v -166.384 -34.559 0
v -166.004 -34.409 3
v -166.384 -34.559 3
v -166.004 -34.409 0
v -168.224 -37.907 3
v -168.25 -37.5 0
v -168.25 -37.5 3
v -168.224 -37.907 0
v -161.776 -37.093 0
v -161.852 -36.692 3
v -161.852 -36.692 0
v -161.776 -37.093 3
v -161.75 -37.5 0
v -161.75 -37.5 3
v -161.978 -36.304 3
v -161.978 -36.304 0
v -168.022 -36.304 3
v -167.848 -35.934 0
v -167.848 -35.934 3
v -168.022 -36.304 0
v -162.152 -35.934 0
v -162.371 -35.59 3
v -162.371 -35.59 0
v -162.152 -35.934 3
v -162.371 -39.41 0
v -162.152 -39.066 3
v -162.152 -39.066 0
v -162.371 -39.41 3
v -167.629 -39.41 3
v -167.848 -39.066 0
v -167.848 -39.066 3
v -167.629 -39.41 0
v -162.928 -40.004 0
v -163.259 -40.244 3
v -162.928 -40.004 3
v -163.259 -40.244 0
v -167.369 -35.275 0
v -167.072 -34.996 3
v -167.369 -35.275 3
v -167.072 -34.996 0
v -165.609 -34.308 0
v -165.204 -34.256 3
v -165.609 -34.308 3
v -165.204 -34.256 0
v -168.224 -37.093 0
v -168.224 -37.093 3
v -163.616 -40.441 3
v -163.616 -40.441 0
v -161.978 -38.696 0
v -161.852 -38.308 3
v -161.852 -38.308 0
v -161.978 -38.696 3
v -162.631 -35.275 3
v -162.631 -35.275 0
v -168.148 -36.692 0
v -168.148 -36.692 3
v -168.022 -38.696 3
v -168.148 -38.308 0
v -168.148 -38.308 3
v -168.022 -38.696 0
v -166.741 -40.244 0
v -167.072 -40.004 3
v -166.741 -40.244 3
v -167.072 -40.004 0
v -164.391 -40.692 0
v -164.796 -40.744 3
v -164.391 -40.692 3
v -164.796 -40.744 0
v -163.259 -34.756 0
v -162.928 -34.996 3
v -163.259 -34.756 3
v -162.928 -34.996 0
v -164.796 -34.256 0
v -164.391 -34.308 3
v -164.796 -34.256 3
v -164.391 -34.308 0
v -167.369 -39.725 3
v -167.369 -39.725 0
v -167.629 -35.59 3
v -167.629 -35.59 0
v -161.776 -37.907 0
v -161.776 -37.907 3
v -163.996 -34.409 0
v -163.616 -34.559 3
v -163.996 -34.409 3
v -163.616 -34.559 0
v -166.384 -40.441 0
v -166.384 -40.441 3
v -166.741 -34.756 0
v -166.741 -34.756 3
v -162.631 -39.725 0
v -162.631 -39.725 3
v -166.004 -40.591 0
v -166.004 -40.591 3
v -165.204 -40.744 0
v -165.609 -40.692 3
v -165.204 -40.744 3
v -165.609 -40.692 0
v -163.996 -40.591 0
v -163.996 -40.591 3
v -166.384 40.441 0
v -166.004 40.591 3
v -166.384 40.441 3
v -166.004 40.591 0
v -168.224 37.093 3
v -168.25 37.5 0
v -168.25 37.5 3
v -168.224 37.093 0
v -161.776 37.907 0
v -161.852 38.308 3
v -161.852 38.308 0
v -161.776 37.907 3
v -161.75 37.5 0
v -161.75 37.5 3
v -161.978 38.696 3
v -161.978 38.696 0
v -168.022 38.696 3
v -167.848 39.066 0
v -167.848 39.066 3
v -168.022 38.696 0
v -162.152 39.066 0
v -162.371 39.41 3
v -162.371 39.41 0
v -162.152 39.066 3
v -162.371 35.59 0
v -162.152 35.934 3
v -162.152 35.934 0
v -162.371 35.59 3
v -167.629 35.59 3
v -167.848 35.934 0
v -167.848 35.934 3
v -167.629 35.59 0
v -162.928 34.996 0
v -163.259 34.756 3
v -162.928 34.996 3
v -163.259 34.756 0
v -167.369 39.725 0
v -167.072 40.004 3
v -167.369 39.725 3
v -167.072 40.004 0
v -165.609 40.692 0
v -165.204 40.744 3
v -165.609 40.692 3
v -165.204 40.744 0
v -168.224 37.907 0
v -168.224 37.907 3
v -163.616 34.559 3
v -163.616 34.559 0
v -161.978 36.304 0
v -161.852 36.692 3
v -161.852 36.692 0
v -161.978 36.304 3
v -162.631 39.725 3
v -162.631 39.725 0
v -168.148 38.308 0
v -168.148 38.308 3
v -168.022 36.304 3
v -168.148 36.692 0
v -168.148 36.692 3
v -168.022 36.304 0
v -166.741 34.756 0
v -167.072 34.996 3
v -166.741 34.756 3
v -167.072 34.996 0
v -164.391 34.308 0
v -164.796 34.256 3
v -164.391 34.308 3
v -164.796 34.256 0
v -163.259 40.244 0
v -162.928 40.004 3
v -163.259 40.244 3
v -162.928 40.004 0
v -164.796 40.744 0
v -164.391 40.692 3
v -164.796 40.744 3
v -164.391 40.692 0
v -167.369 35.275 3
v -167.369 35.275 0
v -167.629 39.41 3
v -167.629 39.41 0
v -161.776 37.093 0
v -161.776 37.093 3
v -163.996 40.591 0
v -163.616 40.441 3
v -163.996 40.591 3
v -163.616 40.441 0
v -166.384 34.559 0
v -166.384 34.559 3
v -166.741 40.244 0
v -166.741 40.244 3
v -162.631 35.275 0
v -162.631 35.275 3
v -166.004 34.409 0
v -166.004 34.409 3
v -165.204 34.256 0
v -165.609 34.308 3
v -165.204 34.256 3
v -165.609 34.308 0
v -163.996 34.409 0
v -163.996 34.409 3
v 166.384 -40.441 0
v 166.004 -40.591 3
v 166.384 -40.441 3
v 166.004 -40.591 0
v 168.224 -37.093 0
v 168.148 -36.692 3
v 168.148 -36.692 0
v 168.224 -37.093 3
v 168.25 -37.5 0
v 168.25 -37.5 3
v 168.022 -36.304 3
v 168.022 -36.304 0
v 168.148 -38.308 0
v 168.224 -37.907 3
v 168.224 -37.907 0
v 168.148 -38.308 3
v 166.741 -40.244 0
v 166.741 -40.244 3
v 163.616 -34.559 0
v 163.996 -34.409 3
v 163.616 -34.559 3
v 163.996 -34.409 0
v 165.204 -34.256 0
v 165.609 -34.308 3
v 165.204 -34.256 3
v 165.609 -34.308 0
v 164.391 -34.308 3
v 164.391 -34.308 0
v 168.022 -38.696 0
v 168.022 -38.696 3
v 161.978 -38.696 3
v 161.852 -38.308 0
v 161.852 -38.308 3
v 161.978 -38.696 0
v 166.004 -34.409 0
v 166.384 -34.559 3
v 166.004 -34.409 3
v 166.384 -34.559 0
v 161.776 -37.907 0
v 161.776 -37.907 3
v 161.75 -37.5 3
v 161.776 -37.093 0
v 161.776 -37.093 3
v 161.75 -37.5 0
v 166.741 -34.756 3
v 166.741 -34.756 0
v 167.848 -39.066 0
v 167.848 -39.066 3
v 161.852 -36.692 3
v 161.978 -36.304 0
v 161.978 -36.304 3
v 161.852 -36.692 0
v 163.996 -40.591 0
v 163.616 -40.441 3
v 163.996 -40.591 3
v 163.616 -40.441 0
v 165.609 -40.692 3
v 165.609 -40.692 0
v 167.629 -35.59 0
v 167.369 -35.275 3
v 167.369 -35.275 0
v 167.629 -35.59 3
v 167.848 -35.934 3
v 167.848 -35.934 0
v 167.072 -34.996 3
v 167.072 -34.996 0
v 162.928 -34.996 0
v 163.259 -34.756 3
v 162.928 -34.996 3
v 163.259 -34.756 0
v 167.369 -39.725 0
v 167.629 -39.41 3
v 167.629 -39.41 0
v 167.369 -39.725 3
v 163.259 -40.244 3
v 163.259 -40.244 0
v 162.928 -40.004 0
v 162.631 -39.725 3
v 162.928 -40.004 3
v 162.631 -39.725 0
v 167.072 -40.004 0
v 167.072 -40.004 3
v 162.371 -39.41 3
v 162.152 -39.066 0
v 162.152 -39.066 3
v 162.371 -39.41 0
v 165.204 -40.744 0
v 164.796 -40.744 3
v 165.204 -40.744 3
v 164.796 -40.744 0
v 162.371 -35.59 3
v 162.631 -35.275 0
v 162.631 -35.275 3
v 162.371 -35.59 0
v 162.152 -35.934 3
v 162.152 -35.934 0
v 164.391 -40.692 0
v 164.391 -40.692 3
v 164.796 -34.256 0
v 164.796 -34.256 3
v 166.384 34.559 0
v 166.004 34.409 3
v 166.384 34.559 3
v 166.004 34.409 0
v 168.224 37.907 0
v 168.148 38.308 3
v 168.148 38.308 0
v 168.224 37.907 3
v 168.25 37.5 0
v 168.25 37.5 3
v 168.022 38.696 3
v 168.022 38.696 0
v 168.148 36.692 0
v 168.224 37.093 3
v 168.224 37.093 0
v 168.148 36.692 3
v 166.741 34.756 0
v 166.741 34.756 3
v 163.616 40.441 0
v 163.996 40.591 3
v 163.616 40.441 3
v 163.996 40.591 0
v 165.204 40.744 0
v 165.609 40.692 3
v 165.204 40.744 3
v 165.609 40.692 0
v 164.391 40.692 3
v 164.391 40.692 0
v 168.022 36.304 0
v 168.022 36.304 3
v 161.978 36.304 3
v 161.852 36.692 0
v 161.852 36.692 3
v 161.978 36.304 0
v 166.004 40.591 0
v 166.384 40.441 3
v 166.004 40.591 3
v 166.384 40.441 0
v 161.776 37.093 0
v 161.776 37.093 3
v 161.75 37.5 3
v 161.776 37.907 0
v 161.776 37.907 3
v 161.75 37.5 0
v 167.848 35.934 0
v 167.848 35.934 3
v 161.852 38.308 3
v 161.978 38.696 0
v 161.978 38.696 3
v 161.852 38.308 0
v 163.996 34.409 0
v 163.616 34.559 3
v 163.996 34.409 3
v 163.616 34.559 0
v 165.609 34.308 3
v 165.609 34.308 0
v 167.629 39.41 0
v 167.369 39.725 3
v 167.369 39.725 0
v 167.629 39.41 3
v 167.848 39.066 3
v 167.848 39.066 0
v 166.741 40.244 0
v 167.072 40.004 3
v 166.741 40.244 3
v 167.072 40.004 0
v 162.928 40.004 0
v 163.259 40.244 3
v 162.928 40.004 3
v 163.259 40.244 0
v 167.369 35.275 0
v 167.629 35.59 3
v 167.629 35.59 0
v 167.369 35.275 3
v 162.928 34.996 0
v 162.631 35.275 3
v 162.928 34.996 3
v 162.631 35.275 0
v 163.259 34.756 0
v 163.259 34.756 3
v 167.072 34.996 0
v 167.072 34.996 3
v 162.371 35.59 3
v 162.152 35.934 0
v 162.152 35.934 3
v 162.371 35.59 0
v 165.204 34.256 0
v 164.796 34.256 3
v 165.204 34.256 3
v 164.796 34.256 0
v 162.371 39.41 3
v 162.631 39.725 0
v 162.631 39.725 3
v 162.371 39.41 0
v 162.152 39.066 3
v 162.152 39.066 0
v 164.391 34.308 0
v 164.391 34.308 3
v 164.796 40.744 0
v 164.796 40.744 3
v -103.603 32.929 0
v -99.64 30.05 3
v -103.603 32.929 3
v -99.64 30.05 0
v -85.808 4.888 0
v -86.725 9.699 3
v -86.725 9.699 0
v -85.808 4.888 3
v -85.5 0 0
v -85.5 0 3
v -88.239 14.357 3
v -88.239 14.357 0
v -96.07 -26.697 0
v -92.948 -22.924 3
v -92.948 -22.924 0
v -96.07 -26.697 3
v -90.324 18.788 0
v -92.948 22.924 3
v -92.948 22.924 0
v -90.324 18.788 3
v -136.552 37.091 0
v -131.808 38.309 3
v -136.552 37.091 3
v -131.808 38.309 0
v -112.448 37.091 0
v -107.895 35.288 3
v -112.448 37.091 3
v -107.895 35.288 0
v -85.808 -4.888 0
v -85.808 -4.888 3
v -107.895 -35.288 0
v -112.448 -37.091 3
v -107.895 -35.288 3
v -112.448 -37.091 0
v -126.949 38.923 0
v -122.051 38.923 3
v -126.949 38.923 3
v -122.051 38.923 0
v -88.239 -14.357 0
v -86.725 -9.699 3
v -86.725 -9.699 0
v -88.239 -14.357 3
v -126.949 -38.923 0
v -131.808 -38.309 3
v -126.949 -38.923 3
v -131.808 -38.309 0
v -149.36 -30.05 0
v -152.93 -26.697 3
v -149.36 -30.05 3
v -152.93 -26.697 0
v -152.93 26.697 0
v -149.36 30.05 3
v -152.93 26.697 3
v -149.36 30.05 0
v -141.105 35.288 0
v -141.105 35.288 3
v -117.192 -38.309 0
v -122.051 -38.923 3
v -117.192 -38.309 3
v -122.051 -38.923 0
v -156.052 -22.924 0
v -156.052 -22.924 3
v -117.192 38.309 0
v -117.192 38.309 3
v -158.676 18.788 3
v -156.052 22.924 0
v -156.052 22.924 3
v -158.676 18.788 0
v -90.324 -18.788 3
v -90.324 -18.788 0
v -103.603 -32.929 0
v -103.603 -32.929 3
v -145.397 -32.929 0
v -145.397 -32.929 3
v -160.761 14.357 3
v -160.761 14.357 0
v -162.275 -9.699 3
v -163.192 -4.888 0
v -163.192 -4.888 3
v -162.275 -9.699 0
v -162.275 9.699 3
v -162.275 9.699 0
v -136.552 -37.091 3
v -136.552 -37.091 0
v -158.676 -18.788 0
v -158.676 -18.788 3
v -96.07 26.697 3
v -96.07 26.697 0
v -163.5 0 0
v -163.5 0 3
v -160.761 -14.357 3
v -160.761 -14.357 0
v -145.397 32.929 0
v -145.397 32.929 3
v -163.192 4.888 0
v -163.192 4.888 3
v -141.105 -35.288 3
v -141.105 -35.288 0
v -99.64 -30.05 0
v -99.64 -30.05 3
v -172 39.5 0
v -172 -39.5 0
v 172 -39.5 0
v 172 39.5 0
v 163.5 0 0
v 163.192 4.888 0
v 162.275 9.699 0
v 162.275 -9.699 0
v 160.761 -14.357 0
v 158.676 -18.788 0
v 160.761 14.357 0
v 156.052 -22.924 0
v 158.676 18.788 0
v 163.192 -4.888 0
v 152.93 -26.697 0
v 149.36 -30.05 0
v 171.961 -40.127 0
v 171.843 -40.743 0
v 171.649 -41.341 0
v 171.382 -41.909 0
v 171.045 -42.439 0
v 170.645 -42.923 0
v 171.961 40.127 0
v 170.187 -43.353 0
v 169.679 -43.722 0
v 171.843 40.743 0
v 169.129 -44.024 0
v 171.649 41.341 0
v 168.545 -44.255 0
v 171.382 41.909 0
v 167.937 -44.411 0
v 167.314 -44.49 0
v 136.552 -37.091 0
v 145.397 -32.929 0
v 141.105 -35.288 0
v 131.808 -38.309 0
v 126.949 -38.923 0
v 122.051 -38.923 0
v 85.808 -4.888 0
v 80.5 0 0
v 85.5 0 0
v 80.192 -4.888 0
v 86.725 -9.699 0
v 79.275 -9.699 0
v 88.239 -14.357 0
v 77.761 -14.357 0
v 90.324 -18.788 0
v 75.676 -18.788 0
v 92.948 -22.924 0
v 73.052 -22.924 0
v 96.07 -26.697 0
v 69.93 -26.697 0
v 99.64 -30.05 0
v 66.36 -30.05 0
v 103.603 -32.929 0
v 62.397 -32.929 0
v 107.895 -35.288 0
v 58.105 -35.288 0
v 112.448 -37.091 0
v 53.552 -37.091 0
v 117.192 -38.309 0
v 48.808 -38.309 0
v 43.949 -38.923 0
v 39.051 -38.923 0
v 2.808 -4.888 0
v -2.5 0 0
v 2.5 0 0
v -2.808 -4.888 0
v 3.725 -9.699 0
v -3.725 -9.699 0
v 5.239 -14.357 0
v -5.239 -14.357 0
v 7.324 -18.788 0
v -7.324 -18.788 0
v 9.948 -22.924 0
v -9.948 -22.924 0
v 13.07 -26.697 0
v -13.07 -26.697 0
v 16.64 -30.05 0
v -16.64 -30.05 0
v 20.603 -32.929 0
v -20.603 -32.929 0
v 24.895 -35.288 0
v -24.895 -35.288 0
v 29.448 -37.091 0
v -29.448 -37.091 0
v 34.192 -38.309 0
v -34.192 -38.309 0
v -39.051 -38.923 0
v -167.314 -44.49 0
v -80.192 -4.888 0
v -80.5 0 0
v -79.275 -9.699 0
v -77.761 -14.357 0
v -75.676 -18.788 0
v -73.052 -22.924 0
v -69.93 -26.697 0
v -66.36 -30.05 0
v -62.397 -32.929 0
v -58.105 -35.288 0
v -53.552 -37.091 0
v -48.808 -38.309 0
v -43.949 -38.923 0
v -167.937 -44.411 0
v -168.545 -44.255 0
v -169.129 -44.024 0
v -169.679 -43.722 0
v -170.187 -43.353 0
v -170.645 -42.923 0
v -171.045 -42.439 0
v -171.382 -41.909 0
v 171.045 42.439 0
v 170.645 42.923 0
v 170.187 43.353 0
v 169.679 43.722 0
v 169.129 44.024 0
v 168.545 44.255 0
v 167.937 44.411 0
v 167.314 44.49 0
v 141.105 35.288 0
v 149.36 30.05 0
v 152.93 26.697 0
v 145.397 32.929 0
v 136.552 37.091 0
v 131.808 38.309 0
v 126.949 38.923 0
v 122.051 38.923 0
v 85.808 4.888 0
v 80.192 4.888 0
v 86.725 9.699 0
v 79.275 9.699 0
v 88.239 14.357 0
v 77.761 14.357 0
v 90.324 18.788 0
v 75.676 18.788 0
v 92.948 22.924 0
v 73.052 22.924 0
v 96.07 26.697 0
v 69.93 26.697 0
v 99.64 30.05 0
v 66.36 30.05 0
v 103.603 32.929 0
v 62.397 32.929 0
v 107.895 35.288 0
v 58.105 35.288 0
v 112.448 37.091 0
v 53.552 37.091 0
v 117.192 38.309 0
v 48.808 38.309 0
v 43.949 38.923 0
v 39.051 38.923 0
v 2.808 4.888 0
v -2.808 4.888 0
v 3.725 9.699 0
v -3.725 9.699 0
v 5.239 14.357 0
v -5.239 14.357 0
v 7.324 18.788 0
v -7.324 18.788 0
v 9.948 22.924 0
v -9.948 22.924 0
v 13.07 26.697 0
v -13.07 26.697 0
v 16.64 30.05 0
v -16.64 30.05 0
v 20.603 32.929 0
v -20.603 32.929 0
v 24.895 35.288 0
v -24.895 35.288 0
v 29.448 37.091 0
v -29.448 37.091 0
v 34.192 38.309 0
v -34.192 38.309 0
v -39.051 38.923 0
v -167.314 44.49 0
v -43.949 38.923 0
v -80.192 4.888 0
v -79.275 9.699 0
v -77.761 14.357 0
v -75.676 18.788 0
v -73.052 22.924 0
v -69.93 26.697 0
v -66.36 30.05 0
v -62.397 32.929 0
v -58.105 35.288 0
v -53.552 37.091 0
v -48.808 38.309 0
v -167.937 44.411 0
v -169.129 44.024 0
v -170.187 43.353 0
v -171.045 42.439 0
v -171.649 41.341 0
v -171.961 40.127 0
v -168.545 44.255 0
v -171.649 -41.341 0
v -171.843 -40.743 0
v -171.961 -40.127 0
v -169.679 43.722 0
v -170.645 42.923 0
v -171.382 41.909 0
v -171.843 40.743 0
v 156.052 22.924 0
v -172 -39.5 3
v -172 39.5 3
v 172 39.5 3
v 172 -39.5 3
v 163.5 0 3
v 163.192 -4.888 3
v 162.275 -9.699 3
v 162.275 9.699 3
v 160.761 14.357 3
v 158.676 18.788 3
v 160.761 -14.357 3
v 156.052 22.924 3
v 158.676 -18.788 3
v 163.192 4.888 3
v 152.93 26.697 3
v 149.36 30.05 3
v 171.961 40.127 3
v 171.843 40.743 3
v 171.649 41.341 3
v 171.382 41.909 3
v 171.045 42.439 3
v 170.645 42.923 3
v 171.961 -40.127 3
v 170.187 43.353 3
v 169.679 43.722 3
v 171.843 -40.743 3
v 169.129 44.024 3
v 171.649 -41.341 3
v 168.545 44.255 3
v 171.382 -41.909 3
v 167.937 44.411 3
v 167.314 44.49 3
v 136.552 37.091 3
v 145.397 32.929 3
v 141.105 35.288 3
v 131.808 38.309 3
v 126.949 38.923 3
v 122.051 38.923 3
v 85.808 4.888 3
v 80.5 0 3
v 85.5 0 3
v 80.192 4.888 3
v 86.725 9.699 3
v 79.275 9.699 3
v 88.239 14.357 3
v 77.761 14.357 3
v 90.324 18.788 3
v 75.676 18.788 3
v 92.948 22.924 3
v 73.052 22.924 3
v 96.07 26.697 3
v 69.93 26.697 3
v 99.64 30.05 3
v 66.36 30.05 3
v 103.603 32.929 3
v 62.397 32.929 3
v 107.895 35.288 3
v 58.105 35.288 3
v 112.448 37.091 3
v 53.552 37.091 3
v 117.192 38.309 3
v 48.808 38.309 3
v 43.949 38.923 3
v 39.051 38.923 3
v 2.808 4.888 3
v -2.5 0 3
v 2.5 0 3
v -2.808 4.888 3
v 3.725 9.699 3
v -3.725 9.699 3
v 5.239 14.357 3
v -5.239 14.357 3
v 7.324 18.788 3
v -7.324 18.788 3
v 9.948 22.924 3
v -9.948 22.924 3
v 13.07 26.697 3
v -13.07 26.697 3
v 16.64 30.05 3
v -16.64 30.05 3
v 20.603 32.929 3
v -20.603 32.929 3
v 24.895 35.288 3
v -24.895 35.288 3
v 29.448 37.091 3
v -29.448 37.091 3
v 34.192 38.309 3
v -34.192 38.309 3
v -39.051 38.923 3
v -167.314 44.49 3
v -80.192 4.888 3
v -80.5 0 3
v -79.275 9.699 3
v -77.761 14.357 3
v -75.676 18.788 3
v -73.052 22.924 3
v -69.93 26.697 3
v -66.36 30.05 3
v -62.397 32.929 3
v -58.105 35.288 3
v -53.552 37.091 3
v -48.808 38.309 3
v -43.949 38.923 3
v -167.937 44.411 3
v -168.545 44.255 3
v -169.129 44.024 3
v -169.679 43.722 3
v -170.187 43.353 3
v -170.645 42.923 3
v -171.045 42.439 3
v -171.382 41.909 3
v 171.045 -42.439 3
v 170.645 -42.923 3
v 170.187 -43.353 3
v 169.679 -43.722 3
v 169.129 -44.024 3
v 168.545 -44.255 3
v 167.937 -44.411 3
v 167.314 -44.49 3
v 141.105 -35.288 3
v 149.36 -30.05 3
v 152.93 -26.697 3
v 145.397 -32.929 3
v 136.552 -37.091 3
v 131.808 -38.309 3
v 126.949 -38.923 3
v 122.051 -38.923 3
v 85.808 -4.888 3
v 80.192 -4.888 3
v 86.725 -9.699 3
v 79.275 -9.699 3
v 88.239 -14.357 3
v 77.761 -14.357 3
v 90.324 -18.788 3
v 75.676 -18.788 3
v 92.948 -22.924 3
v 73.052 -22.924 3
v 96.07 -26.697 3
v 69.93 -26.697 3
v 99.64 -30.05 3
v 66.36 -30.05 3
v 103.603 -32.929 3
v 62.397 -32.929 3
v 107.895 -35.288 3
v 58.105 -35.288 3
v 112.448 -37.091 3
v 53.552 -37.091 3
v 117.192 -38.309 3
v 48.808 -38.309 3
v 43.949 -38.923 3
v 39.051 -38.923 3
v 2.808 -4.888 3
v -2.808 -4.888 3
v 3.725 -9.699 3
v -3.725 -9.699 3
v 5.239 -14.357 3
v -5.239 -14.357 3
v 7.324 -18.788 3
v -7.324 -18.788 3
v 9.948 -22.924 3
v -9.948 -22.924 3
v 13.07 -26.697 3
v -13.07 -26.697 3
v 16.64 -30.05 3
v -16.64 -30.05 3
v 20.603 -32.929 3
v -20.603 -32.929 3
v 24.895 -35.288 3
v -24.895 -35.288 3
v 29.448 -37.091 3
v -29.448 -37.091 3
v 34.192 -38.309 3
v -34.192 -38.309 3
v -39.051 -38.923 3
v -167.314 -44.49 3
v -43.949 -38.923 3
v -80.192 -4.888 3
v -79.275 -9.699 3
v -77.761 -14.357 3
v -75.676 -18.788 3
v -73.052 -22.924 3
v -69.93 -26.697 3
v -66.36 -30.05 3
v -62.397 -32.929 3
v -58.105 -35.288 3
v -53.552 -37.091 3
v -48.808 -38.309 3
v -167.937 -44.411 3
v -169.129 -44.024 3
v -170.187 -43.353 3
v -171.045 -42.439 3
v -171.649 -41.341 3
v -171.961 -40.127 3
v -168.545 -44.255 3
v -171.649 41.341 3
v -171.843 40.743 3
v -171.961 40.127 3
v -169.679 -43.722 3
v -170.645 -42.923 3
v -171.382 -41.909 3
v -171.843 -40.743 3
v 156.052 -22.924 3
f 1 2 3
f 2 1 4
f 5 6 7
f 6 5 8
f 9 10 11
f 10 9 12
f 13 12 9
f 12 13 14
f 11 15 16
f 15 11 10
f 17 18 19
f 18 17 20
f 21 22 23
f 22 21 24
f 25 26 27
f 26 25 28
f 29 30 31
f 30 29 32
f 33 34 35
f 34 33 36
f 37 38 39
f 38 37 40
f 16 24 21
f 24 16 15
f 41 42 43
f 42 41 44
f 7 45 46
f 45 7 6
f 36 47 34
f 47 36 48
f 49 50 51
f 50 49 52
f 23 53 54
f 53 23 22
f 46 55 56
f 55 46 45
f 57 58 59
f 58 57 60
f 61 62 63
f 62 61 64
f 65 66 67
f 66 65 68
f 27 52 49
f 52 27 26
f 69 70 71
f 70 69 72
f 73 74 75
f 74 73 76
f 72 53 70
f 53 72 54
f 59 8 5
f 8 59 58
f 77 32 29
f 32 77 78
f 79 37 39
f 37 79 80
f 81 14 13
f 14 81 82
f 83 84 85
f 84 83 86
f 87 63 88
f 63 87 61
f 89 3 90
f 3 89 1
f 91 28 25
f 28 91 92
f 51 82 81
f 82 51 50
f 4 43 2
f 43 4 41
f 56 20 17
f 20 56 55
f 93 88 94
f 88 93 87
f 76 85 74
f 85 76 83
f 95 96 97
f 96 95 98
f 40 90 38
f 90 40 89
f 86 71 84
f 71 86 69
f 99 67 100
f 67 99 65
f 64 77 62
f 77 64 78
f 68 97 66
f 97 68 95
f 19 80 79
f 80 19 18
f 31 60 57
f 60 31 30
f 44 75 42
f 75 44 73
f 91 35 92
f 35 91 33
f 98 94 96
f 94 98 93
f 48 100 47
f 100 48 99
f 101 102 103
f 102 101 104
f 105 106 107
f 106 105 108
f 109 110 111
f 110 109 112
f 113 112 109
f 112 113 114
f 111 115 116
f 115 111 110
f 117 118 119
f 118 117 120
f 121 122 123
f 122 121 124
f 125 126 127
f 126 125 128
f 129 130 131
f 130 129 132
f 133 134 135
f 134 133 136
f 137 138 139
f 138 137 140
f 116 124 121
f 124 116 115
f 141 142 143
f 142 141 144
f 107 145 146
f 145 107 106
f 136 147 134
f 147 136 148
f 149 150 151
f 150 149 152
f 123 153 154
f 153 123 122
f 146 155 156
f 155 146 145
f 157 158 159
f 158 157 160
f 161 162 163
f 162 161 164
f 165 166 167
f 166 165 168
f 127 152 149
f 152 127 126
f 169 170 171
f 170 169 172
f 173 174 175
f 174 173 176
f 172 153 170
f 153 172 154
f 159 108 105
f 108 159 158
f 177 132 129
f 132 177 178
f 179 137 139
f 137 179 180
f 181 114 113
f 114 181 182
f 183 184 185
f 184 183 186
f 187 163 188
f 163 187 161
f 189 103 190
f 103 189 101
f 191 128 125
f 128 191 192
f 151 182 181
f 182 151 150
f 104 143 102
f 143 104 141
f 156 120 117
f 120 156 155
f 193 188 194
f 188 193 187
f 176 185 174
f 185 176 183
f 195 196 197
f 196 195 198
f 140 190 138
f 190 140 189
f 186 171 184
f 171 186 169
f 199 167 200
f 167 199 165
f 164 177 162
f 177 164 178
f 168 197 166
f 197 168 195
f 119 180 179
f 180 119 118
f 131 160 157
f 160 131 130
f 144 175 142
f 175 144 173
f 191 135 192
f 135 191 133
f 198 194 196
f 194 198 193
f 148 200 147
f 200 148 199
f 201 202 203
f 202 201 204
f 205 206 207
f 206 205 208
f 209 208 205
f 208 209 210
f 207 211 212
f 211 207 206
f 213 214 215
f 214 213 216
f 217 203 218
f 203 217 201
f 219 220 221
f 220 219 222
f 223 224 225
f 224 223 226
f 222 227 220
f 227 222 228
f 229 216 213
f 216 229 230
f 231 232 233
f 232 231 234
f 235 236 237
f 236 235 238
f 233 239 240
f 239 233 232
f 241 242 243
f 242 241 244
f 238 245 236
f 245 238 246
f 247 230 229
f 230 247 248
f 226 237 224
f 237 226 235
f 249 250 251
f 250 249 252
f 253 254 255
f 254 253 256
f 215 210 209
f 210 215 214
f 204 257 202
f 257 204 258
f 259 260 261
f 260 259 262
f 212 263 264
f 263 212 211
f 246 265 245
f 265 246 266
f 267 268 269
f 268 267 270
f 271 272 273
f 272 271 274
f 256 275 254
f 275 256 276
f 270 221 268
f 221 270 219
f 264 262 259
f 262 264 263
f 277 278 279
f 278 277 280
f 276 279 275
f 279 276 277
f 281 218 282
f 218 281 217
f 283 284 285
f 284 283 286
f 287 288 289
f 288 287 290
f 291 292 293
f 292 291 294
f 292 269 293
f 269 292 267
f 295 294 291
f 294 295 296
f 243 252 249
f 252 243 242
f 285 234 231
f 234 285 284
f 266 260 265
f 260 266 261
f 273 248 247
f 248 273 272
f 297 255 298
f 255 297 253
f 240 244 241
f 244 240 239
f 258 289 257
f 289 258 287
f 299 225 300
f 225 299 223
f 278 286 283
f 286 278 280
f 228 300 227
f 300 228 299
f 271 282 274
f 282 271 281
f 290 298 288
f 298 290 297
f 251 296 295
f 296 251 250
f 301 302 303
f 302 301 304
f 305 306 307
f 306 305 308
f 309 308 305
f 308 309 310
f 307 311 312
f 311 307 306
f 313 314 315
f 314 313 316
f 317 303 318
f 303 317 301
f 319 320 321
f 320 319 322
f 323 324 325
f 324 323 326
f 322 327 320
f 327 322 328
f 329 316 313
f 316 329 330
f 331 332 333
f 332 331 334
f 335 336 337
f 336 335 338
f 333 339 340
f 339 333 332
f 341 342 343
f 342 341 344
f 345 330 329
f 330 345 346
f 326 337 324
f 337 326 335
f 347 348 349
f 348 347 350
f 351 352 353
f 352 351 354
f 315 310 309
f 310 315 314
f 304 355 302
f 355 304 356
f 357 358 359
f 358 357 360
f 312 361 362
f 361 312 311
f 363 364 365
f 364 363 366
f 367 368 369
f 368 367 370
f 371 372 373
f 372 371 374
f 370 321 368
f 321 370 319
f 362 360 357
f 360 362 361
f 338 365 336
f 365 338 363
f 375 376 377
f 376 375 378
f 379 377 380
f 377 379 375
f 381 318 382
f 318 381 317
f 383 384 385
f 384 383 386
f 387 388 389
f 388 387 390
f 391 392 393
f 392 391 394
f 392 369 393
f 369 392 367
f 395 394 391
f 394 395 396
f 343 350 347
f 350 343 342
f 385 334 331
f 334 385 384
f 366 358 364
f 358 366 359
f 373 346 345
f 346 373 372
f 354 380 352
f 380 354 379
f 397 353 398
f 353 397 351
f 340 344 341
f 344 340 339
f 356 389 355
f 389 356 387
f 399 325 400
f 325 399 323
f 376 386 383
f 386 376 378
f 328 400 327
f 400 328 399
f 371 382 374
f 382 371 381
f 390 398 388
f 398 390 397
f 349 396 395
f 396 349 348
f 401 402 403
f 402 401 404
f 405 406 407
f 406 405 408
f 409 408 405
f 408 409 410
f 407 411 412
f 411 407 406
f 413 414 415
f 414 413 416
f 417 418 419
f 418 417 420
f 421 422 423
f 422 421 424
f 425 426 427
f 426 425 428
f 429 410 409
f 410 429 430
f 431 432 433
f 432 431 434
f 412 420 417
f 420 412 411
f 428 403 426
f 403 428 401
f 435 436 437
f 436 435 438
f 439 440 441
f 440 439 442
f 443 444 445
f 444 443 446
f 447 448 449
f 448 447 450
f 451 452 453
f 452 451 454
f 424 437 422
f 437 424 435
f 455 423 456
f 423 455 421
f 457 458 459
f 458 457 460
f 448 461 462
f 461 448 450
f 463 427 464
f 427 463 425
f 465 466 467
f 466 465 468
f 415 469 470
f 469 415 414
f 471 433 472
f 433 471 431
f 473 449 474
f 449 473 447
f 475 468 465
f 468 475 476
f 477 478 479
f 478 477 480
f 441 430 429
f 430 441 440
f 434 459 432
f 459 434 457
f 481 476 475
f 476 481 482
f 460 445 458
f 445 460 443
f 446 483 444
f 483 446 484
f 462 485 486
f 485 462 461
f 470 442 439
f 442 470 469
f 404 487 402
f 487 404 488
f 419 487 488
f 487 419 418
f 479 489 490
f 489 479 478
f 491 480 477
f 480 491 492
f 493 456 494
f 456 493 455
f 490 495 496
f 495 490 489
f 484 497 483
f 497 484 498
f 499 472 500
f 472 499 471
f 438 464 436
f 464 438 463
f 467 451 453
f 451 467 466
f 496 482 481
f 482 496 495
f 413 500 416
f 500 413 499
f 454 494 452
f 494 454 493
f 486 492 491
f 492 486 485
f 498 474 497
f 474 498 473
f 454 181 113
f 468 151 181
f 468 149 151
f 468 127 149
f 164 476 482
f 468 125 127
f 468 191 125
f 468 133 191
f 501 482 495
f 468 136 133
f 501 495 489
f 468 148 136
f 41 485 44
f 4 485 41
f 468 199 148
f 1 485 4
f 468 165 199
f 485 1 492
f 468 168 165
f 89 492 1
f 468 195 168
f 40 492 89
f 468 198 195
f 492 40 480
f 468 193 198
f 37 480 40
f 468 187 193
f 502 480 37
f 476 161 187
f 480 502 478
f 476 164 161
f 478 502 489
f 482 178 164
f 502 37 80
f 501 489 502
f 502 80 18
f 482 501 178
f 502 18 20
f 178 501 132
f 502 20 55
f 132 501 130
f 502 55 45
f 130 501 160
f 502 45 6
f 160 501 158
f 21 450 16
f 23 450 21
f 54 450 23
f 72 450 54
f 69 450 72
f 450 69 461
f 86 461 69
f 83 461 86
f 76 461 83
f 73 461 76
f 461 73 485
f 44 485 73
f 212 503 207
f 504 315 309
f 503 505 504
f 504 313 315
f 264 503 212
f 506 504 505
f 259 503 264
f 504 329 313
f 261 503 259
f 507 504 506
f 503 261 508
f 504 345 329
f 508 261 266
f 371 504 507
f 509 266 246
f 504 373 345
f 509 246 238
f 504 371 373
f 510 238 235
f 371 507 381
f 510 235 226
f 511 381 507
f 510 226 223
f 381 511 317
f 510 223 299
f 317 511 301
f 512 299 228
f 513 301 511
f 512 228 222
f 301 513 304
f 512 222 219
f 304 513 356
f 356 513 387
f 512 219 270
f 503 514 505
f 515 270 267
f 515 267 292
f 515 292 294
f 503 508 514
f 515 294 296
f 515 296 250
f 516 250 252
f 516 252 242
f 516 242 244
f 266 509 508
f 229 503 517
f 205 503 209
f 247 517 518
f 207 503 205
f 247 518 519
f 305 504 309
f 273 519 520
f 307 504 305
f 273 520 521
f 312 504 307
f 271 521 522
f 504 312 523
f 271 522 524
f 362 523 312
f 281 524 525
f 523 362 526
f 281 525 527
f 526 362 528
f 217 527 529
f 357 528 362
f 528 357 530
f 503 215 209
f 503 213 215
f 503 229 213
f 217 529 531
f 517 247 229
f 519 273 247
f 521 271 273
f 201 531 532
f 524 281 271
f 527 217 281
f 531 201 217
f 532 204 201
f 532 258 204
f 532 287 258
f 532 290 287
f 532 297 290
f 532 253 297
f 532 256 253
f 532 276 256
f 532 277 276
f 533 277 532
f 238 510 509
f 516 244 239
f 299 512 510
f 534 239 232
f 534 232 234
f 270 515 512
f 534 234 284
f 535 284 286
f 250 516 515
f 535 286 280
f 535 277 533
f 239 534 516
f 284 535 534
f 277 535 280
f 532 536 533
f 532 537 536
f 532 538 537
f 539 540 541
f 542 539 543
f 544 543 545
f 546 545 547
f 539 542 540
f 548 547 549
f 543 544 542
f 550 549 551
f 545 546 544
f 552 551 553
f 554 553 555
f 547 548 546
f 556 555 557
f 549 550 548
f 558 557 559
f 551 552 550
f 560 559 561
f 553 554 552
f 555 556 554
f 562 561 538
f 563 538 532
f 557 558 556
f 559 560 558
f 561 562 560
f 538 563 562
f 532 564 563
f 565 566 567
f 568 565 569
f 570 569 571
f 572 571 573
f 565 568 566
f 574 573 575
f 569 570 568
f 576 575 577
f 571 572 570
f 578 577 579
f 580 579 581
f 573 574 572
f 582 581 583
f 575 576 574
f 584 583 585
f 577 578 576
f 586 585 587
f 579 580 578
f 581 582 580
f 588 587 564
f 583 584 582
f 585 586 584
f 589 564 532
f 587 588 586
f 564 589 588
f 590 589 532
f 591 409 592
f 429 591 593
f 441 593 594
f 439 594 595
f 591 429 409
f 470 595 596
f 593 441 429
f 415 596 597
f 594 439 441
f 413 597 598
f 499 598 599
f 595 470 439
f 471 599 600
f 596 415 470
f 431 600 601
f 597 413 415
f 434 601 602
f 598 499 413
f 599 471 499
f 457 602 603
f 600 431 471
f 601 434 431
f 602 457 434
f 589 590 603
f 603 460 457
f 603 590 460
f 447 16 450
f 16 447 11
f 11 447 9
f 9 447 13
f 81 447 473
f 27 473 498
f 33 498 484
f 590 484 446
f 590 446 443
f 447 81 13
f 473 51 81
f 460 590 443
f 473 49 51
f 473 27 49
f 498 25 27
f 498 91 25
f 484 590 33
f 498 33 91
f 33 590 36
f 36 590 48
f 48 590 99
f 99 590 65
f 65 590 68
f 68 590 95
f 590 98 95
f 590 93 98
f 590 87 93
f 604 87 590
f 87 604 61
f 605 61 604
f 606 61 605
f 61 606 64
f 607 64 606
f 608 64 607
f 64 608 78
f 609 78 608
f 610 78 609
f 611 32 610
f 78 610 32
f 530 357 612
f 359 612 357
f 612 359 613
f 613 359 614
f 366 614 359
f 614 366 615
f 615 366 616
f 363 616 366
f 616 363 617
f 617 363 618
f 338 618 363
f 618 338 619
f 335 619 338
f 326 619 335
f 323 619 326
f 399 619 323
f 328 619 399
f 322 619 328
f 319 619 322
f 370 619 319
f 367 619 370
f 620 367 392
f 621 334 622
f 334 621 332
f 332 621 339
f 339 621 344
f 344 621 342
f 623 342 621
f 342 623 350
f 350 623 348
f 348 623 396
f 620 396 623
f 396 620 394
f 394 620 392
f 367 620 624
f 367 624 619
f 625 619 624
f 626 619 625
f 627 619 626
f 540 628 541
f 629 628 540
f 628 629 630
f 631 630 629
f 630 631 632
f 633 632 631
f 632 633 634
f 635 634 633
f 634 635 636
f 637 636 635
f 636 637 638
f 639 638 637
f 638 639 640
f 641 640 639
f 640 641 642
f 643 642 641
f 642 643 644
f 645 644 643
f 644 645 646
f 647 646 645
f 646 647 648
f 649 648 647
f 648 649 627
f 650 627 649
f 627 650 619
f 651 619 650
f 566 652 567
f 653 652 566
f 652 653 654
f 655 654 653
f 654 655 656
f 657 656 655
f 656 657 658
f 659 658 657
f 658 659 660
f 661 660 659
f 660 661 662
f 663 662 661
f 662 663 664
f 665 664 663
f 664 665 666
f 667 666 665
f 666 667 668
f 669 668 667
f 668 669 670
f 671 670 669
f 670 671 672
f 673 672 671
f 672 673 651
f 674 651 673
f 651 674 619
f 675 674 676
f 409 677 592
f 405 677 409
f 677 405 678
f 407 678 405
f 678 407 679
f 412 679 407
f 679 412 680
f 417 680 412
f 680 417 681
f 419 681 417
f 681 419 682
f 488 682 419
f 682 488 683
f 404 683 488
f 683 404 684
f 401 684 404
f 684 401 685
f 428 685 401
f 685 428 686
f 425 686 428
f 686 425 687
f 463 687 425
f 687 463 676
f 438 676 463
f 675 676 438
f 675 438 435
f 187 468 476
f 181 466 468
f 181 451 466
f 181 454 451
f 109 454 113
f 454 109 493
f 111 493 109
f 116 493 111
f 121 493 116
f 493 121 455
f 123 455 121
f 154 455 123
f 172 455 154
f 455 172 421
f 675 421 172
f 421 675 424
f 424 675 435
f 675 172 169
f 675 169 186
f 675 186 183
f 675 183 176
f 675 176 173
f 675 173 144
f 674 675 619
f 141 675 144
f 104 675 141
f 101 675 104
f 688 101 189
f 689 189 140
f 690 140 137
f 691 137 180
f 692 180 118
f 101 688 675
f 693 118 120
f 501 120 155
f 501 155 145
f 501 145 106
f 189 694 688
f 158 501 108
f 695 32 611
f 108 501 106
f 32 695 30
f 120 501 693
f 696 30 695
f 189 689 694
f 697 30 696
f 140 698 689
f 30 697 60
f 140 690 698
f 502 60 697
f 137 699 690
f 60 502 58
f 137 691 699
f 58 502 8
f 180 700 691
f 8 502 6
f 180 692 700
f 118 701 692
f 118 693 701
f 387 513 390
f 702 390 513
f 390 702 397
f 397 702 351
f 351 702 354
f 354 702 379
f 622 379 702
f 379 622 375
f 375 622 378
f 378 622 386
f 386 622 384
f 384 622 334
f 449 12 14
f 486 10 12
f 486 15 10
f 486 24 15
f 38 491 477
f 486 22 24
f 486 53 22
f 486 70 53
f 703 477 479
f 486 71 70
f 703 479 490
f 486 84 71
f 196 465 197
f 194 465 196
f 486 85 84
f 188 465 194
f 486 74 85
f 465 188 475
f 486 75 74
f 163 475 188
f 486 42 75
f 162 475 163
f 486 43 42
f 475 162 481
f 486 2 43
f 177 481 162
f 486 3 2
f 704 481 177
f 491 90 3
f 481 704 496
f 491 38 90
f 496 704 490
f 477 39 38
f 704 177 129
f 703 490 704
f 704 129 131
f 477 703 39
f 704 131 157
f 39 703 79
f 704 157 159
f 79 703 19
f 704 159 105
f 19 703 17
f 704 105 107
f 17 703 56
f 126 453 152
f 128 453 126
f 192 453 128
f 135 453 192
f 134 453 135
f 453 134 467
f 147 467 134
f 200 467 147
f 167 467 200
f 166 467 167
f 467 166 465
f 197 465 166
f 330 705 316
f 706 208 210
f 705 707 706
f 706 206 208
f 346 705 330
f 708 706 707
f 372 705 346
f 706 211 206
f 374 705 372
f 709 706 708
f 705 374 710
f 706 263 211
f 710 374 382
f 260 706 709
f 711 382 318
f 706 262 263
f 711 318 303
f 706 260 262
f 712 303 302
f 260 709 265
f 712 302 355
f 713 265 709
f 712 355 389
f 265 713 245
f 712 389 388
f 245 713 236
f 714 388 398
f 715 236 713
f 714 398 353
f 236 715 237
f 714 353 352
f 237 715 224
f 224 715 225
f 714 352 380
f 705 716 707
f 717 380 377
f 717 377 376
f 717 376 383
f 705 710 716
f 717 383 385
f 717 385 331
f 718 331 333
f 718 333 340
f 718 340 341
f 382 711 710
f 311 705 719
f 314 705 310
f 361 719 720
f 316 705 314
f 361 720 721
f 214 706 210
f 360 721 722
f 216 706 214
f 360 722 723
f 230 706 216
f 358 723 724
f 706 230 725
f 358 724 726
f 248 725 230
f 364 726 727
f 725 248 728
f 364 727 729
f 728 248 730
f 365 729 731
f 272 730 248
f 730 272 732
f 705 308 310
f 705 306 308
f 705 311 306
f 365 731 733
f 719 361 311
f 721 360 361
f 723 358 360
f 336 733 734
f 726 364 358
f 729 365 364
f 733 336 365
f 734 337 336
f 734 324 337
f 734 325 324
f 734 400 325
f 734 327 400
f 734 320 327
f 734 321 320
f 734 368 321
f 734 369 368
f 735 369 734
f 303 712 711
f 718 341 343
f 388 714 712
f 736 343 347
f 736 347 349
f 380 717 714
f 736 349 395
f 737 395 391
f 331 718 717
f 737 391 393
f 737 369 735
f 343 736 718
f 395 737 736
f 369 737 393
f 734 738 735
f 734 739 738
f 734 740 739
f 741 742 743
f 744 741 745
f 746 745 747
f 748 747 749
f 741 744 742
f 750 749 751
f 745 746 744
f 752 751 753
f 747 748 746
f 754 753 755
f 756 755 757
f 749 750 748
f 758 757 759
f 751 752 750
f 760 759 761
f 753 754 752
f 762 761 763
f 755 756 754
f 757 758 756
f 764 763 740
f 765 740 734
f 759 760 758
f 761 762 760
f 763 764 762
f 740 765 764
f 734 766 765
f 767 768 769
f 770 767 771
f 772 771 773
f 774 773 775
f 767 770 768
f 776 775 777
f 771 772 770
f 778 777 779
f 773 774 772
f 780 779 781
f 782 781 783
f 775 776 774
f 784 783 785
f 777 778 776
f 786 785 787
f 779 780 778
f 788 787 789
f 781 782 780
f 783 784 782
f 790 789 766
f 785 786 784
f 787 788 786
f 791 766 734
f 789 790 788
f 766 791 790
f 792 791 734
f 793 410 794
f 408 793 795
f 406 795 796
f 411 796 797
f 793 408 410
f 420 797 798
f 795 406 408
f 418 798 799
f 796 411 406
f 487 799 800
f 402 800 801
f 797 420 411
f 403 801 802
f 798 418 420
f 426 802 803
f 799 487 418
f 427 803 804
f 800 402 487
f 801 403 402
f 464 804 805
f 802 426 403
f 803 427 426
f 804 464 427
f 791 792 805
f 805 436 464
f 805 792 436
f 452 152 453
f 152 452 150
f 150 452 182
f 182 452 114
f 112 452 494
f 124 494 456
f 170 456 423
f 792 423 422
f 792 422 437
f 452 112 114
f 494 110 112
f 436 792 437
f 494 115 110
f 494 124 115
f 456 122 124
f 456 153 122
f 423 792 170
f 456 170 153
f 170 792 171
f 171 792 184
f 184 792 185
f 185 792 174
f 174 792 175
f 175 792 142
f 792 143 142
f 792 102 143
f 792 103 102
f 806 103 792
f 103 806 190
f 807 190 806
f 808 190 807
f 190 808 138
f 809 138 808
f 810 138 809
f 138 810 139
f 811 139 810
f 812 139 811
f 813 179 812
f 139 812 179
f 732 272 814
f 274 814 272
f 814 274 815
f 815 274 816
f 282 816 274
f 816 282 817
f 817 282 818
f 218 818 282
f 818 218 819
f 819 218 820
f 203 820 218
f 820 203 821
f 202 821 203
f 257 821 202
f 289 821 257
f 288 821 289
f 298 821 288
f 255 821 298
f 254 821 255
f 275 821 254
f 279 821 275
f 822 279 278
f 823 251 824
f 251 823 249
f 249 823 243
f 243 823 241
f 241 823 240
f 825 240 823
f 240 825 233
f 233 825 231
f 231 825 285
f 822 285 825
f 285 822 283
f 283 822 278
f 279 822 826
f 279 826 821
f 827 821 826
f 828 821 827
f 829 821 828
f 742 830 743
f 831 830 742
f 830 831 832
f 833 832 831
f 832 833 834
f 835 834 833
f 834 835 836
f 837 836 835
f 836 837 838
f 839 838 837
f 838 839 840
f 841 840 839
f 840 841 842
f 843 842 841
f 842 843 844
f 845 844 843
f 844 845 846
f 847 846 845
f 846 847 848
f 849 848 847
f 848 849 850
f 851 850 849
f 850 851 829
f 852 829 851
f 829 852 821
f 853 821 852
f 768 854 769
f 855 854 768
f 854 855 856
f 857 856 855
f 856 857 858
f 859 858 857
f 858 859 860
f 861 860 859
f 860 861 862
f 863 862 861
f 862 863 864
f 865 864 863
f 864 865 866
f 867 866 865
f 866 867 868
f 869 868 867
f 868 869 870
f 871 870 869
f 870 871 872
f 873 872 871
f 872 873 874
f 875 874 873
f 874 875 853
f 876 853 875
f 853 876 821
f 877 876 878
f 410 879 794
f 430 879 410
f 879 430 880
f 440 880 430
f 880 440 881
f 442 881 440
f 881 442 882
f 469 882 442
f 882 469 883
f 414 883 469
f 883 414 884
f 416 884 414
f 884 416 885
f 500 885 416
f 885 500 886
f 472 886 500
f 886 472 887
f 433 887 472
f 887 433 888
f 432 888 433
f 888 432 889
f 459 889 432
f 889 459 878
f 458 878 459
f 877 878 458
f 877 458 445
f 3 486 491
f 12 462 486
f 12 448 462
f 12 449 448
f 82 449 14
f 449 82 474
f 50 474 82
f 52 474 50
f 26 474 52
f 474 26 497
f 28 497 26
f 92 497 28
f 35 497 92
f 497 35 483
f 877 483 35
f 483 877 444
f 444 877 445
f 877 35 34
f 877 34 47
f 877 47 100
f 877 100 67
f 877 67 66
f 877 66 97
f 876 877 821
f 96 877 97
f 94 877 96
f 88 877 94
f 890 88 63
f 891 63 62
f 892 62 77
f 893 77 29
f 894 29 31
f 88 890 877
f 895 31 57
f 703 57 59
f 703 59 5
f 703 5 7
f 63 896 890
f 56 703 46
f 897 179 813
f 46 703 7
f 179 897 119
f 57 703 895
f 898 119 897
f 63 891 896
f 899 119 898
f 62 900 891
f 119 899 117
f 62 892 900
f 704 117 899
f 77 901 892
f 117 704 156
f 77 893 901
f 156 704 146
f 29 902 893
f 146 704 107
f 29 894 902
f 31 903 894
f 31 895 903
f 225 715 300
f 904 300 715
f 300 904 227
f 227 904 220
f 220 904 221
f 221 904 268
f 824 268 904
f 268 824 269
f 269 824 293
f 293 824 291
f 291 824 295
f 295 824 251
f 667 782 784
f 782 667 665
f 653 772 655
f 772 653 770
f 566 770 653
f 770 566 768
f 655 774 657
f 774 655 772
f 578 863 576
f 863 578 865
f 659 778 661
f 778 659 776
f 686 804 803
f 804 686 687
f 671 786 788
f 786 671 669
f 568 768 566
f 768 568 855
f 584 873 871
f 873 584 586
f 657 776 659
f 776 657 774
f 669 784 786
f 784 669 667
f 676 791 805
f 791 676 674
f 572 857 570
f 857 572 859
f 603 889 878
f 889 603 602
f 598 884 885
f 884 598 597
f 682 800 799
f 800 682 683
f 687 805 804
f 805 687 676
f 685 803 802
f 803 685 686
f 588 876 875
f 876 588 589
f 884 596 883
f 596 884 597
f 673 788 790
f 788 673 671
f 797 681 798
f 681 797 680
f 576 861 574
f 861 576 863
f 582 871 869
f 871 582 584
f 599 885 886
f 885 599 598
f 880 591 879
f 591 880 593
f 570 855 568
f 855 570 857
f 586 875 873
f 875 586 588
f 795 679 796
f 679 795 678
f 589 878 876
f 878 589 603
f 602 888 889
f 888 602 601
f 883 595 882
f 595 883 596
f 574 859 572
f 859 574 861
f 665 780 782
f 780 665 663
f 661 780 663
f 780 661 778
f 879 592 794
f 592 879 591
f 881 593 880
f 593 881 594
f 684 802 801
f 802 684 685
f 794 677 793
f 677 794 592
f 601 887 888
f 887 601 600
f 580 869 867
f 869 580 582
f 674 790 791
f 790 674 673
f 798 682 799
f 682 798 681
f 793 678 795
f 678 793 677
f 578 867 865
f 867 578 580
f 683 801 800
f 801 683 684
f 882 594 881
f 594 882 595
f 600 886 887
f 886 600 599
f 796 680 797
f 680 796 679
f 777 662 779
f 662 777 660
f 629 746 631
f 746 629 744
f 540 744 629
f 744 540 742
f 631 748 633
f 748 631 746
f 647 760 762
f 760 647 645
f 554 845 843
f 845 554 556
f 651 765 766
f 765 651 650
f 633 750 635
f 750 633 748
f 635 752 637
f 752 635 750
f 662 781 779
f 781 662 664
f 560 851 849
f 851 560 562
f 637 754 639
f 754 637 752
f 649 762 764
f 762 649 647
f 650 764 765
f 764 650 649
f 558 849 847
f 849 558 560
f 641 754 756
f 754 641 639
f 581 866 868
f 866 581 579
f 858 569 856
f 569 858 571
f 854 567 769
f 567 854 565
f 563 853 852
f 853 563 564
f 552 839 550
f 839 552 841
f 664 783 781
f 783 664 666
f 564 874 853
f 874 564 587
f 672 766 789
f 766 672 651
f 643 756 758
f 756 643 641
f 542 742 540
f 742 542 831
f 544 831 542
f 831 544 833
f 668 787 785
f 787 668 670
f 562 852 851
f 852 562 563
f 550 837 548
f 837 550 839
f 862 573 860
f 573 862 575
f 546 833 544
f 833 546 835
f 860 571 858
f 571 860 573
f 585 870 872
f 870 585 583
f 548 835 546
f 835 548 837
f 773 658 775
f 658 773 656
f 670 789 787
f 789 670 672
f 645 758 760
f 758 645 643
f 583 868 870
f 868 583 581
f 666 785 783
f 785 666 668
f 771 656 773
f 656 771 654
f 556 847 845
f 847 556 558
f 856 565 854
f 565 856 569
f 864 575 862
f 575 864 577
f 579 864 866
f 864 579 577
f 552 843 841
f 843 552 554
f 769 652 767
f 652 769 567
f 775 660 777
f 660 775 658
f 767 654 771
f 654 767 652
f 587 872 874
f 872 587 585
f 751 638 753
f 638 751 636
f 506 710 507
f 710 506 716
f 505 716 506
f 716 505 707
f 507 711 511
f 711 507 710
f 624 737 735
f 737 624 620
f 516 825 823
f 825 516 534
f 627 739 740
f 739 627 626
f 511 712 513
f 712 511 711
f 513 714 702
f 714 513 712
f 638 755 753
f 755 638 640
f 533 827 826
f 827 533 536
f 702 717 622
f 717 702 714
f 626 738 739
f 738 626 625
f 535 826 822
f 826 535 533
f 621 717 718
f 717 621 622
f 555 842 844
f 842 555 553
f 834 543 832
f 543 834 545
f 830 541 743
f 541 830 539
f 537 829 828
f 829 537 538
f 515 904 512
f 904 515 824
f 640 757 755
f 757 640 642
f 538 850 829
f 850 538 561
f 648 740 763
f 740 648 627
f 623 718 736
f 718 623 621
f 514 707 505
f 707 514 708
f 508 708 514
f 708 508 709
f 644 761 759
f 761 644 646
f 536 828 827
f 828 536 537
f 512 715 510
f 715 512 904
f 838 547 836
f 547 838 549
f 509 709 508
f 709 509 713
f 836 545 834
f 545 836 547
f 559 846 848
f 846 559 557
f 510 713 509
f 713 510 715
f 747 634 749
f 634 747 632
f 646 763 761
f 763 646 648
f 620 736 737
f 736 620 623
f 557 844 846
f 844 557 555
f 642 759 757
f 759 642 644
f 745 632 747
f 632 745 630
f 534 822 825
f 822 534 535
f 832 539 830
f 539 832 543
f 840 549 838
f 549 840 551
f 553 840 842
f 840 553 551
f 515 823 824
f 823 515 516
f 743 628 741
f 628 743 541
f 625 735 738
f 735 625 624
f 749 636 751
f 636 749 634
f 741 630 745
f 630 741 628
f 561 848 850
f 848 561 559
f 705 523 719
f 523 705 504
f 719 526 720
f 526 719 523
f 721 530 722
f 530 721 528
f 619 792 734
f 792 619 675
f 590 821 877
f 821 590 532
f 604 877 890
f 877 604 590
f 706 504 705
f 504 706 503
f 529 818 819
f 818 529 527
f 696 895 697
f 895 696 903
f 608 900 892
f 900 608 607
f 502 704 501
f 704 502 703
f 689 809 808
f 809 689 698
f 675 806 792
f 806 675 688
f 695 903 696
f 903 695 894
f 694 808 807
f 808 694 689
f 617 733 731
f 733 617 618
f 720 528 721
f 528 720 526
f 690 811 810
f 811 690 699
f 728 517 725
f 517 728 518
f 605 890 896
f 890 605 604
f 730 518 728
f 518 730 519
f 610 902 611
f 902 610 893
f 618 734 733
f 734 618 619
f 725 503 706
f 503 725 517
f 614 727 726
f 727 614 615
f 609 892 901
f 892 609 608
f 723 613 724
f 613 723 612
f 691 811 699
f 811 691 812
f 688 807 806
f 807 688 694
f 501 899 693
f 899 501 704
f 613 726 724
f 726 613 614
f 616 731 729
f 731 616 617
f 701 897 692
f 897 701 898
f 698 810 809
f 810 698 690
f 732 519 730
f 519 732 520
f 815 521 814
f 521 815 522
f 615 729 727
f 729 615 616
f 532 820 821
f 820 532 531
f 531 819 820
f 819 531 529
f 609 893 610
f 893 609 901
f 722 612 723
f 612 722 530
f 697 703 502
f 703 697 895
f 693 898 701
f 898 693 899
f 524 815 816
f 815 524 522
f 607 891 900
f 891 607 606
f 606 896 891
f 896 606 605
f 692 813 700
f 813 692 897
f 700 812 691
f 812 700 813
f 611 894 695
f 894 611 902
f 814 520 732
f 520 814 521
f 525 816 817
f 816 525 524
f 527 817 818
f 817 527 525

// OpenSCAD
$fn = 50;

difference() {
	union() {
		hull() {
			translate(v = [-167.0, 39.5, 0]) {
				cylinder(h = 3, r = 5);
			}
			translate(v = [167.0, 39.5, 0]) {
				cylinder(h = 3, r = 5);
			}
			translate(v = [-167.0, -39.5, 0]) {
				cylinder(h = 3, r = 5);
			}
			translate(v = [167.0, -39.5, 0]) {
				cylinder(h = 3, r = 5);
			}
		}
	}
	union() {
		translate(v = [-165.0, -37.5, -100.0]) {
			cylinder(h = 200, r = 3.25);
		}
		translate(v = [-165.0, 37.5, -100.0]) {
			cylinder(h = 200, r = 3.25);
		}
		translate(v = [165.0, -37.5, -100.0]) {
			cylinder(h = 200, r = 3.25);
		}
		translate(v = [165.0, 37.5, -100.0]) {
			cylinder(h = 200, r = 3.25);
		}
		translate(v = [-165.0, -37.5, -100.0]) {
			cylinder(h = 200, r = 1.8);
		}
		translate(v = [-165.0, 37.5, -100.0]) {
			cylinder(h = 200, r = 1.8);
		}
		translate(v = [165.0, -37.5, -100.0]) {
			cylinder(h = 200, r = 1.8);
		}
		translate(v = [165.0, 37.5, -100.0]) {
			cylinder(h = 200, r = 1.8);
		}
		translate(v = [-124.5, 0, 0.0]) {
			cylinder(h = 3, r = 39.0);
		}
		translate(v = [-41.5, 0, 0.0]) {
			cylinder(h = 3, r = 39.0);
		}
		translate(v = [41.5, 0, 0.0]) {
			cylinder(h = 3, r = 39.0);
		}
		translate(v = [124.5, 0, 0.0]) {
			cylinder(h = 3, r = 39.0);
		}
	}
}
